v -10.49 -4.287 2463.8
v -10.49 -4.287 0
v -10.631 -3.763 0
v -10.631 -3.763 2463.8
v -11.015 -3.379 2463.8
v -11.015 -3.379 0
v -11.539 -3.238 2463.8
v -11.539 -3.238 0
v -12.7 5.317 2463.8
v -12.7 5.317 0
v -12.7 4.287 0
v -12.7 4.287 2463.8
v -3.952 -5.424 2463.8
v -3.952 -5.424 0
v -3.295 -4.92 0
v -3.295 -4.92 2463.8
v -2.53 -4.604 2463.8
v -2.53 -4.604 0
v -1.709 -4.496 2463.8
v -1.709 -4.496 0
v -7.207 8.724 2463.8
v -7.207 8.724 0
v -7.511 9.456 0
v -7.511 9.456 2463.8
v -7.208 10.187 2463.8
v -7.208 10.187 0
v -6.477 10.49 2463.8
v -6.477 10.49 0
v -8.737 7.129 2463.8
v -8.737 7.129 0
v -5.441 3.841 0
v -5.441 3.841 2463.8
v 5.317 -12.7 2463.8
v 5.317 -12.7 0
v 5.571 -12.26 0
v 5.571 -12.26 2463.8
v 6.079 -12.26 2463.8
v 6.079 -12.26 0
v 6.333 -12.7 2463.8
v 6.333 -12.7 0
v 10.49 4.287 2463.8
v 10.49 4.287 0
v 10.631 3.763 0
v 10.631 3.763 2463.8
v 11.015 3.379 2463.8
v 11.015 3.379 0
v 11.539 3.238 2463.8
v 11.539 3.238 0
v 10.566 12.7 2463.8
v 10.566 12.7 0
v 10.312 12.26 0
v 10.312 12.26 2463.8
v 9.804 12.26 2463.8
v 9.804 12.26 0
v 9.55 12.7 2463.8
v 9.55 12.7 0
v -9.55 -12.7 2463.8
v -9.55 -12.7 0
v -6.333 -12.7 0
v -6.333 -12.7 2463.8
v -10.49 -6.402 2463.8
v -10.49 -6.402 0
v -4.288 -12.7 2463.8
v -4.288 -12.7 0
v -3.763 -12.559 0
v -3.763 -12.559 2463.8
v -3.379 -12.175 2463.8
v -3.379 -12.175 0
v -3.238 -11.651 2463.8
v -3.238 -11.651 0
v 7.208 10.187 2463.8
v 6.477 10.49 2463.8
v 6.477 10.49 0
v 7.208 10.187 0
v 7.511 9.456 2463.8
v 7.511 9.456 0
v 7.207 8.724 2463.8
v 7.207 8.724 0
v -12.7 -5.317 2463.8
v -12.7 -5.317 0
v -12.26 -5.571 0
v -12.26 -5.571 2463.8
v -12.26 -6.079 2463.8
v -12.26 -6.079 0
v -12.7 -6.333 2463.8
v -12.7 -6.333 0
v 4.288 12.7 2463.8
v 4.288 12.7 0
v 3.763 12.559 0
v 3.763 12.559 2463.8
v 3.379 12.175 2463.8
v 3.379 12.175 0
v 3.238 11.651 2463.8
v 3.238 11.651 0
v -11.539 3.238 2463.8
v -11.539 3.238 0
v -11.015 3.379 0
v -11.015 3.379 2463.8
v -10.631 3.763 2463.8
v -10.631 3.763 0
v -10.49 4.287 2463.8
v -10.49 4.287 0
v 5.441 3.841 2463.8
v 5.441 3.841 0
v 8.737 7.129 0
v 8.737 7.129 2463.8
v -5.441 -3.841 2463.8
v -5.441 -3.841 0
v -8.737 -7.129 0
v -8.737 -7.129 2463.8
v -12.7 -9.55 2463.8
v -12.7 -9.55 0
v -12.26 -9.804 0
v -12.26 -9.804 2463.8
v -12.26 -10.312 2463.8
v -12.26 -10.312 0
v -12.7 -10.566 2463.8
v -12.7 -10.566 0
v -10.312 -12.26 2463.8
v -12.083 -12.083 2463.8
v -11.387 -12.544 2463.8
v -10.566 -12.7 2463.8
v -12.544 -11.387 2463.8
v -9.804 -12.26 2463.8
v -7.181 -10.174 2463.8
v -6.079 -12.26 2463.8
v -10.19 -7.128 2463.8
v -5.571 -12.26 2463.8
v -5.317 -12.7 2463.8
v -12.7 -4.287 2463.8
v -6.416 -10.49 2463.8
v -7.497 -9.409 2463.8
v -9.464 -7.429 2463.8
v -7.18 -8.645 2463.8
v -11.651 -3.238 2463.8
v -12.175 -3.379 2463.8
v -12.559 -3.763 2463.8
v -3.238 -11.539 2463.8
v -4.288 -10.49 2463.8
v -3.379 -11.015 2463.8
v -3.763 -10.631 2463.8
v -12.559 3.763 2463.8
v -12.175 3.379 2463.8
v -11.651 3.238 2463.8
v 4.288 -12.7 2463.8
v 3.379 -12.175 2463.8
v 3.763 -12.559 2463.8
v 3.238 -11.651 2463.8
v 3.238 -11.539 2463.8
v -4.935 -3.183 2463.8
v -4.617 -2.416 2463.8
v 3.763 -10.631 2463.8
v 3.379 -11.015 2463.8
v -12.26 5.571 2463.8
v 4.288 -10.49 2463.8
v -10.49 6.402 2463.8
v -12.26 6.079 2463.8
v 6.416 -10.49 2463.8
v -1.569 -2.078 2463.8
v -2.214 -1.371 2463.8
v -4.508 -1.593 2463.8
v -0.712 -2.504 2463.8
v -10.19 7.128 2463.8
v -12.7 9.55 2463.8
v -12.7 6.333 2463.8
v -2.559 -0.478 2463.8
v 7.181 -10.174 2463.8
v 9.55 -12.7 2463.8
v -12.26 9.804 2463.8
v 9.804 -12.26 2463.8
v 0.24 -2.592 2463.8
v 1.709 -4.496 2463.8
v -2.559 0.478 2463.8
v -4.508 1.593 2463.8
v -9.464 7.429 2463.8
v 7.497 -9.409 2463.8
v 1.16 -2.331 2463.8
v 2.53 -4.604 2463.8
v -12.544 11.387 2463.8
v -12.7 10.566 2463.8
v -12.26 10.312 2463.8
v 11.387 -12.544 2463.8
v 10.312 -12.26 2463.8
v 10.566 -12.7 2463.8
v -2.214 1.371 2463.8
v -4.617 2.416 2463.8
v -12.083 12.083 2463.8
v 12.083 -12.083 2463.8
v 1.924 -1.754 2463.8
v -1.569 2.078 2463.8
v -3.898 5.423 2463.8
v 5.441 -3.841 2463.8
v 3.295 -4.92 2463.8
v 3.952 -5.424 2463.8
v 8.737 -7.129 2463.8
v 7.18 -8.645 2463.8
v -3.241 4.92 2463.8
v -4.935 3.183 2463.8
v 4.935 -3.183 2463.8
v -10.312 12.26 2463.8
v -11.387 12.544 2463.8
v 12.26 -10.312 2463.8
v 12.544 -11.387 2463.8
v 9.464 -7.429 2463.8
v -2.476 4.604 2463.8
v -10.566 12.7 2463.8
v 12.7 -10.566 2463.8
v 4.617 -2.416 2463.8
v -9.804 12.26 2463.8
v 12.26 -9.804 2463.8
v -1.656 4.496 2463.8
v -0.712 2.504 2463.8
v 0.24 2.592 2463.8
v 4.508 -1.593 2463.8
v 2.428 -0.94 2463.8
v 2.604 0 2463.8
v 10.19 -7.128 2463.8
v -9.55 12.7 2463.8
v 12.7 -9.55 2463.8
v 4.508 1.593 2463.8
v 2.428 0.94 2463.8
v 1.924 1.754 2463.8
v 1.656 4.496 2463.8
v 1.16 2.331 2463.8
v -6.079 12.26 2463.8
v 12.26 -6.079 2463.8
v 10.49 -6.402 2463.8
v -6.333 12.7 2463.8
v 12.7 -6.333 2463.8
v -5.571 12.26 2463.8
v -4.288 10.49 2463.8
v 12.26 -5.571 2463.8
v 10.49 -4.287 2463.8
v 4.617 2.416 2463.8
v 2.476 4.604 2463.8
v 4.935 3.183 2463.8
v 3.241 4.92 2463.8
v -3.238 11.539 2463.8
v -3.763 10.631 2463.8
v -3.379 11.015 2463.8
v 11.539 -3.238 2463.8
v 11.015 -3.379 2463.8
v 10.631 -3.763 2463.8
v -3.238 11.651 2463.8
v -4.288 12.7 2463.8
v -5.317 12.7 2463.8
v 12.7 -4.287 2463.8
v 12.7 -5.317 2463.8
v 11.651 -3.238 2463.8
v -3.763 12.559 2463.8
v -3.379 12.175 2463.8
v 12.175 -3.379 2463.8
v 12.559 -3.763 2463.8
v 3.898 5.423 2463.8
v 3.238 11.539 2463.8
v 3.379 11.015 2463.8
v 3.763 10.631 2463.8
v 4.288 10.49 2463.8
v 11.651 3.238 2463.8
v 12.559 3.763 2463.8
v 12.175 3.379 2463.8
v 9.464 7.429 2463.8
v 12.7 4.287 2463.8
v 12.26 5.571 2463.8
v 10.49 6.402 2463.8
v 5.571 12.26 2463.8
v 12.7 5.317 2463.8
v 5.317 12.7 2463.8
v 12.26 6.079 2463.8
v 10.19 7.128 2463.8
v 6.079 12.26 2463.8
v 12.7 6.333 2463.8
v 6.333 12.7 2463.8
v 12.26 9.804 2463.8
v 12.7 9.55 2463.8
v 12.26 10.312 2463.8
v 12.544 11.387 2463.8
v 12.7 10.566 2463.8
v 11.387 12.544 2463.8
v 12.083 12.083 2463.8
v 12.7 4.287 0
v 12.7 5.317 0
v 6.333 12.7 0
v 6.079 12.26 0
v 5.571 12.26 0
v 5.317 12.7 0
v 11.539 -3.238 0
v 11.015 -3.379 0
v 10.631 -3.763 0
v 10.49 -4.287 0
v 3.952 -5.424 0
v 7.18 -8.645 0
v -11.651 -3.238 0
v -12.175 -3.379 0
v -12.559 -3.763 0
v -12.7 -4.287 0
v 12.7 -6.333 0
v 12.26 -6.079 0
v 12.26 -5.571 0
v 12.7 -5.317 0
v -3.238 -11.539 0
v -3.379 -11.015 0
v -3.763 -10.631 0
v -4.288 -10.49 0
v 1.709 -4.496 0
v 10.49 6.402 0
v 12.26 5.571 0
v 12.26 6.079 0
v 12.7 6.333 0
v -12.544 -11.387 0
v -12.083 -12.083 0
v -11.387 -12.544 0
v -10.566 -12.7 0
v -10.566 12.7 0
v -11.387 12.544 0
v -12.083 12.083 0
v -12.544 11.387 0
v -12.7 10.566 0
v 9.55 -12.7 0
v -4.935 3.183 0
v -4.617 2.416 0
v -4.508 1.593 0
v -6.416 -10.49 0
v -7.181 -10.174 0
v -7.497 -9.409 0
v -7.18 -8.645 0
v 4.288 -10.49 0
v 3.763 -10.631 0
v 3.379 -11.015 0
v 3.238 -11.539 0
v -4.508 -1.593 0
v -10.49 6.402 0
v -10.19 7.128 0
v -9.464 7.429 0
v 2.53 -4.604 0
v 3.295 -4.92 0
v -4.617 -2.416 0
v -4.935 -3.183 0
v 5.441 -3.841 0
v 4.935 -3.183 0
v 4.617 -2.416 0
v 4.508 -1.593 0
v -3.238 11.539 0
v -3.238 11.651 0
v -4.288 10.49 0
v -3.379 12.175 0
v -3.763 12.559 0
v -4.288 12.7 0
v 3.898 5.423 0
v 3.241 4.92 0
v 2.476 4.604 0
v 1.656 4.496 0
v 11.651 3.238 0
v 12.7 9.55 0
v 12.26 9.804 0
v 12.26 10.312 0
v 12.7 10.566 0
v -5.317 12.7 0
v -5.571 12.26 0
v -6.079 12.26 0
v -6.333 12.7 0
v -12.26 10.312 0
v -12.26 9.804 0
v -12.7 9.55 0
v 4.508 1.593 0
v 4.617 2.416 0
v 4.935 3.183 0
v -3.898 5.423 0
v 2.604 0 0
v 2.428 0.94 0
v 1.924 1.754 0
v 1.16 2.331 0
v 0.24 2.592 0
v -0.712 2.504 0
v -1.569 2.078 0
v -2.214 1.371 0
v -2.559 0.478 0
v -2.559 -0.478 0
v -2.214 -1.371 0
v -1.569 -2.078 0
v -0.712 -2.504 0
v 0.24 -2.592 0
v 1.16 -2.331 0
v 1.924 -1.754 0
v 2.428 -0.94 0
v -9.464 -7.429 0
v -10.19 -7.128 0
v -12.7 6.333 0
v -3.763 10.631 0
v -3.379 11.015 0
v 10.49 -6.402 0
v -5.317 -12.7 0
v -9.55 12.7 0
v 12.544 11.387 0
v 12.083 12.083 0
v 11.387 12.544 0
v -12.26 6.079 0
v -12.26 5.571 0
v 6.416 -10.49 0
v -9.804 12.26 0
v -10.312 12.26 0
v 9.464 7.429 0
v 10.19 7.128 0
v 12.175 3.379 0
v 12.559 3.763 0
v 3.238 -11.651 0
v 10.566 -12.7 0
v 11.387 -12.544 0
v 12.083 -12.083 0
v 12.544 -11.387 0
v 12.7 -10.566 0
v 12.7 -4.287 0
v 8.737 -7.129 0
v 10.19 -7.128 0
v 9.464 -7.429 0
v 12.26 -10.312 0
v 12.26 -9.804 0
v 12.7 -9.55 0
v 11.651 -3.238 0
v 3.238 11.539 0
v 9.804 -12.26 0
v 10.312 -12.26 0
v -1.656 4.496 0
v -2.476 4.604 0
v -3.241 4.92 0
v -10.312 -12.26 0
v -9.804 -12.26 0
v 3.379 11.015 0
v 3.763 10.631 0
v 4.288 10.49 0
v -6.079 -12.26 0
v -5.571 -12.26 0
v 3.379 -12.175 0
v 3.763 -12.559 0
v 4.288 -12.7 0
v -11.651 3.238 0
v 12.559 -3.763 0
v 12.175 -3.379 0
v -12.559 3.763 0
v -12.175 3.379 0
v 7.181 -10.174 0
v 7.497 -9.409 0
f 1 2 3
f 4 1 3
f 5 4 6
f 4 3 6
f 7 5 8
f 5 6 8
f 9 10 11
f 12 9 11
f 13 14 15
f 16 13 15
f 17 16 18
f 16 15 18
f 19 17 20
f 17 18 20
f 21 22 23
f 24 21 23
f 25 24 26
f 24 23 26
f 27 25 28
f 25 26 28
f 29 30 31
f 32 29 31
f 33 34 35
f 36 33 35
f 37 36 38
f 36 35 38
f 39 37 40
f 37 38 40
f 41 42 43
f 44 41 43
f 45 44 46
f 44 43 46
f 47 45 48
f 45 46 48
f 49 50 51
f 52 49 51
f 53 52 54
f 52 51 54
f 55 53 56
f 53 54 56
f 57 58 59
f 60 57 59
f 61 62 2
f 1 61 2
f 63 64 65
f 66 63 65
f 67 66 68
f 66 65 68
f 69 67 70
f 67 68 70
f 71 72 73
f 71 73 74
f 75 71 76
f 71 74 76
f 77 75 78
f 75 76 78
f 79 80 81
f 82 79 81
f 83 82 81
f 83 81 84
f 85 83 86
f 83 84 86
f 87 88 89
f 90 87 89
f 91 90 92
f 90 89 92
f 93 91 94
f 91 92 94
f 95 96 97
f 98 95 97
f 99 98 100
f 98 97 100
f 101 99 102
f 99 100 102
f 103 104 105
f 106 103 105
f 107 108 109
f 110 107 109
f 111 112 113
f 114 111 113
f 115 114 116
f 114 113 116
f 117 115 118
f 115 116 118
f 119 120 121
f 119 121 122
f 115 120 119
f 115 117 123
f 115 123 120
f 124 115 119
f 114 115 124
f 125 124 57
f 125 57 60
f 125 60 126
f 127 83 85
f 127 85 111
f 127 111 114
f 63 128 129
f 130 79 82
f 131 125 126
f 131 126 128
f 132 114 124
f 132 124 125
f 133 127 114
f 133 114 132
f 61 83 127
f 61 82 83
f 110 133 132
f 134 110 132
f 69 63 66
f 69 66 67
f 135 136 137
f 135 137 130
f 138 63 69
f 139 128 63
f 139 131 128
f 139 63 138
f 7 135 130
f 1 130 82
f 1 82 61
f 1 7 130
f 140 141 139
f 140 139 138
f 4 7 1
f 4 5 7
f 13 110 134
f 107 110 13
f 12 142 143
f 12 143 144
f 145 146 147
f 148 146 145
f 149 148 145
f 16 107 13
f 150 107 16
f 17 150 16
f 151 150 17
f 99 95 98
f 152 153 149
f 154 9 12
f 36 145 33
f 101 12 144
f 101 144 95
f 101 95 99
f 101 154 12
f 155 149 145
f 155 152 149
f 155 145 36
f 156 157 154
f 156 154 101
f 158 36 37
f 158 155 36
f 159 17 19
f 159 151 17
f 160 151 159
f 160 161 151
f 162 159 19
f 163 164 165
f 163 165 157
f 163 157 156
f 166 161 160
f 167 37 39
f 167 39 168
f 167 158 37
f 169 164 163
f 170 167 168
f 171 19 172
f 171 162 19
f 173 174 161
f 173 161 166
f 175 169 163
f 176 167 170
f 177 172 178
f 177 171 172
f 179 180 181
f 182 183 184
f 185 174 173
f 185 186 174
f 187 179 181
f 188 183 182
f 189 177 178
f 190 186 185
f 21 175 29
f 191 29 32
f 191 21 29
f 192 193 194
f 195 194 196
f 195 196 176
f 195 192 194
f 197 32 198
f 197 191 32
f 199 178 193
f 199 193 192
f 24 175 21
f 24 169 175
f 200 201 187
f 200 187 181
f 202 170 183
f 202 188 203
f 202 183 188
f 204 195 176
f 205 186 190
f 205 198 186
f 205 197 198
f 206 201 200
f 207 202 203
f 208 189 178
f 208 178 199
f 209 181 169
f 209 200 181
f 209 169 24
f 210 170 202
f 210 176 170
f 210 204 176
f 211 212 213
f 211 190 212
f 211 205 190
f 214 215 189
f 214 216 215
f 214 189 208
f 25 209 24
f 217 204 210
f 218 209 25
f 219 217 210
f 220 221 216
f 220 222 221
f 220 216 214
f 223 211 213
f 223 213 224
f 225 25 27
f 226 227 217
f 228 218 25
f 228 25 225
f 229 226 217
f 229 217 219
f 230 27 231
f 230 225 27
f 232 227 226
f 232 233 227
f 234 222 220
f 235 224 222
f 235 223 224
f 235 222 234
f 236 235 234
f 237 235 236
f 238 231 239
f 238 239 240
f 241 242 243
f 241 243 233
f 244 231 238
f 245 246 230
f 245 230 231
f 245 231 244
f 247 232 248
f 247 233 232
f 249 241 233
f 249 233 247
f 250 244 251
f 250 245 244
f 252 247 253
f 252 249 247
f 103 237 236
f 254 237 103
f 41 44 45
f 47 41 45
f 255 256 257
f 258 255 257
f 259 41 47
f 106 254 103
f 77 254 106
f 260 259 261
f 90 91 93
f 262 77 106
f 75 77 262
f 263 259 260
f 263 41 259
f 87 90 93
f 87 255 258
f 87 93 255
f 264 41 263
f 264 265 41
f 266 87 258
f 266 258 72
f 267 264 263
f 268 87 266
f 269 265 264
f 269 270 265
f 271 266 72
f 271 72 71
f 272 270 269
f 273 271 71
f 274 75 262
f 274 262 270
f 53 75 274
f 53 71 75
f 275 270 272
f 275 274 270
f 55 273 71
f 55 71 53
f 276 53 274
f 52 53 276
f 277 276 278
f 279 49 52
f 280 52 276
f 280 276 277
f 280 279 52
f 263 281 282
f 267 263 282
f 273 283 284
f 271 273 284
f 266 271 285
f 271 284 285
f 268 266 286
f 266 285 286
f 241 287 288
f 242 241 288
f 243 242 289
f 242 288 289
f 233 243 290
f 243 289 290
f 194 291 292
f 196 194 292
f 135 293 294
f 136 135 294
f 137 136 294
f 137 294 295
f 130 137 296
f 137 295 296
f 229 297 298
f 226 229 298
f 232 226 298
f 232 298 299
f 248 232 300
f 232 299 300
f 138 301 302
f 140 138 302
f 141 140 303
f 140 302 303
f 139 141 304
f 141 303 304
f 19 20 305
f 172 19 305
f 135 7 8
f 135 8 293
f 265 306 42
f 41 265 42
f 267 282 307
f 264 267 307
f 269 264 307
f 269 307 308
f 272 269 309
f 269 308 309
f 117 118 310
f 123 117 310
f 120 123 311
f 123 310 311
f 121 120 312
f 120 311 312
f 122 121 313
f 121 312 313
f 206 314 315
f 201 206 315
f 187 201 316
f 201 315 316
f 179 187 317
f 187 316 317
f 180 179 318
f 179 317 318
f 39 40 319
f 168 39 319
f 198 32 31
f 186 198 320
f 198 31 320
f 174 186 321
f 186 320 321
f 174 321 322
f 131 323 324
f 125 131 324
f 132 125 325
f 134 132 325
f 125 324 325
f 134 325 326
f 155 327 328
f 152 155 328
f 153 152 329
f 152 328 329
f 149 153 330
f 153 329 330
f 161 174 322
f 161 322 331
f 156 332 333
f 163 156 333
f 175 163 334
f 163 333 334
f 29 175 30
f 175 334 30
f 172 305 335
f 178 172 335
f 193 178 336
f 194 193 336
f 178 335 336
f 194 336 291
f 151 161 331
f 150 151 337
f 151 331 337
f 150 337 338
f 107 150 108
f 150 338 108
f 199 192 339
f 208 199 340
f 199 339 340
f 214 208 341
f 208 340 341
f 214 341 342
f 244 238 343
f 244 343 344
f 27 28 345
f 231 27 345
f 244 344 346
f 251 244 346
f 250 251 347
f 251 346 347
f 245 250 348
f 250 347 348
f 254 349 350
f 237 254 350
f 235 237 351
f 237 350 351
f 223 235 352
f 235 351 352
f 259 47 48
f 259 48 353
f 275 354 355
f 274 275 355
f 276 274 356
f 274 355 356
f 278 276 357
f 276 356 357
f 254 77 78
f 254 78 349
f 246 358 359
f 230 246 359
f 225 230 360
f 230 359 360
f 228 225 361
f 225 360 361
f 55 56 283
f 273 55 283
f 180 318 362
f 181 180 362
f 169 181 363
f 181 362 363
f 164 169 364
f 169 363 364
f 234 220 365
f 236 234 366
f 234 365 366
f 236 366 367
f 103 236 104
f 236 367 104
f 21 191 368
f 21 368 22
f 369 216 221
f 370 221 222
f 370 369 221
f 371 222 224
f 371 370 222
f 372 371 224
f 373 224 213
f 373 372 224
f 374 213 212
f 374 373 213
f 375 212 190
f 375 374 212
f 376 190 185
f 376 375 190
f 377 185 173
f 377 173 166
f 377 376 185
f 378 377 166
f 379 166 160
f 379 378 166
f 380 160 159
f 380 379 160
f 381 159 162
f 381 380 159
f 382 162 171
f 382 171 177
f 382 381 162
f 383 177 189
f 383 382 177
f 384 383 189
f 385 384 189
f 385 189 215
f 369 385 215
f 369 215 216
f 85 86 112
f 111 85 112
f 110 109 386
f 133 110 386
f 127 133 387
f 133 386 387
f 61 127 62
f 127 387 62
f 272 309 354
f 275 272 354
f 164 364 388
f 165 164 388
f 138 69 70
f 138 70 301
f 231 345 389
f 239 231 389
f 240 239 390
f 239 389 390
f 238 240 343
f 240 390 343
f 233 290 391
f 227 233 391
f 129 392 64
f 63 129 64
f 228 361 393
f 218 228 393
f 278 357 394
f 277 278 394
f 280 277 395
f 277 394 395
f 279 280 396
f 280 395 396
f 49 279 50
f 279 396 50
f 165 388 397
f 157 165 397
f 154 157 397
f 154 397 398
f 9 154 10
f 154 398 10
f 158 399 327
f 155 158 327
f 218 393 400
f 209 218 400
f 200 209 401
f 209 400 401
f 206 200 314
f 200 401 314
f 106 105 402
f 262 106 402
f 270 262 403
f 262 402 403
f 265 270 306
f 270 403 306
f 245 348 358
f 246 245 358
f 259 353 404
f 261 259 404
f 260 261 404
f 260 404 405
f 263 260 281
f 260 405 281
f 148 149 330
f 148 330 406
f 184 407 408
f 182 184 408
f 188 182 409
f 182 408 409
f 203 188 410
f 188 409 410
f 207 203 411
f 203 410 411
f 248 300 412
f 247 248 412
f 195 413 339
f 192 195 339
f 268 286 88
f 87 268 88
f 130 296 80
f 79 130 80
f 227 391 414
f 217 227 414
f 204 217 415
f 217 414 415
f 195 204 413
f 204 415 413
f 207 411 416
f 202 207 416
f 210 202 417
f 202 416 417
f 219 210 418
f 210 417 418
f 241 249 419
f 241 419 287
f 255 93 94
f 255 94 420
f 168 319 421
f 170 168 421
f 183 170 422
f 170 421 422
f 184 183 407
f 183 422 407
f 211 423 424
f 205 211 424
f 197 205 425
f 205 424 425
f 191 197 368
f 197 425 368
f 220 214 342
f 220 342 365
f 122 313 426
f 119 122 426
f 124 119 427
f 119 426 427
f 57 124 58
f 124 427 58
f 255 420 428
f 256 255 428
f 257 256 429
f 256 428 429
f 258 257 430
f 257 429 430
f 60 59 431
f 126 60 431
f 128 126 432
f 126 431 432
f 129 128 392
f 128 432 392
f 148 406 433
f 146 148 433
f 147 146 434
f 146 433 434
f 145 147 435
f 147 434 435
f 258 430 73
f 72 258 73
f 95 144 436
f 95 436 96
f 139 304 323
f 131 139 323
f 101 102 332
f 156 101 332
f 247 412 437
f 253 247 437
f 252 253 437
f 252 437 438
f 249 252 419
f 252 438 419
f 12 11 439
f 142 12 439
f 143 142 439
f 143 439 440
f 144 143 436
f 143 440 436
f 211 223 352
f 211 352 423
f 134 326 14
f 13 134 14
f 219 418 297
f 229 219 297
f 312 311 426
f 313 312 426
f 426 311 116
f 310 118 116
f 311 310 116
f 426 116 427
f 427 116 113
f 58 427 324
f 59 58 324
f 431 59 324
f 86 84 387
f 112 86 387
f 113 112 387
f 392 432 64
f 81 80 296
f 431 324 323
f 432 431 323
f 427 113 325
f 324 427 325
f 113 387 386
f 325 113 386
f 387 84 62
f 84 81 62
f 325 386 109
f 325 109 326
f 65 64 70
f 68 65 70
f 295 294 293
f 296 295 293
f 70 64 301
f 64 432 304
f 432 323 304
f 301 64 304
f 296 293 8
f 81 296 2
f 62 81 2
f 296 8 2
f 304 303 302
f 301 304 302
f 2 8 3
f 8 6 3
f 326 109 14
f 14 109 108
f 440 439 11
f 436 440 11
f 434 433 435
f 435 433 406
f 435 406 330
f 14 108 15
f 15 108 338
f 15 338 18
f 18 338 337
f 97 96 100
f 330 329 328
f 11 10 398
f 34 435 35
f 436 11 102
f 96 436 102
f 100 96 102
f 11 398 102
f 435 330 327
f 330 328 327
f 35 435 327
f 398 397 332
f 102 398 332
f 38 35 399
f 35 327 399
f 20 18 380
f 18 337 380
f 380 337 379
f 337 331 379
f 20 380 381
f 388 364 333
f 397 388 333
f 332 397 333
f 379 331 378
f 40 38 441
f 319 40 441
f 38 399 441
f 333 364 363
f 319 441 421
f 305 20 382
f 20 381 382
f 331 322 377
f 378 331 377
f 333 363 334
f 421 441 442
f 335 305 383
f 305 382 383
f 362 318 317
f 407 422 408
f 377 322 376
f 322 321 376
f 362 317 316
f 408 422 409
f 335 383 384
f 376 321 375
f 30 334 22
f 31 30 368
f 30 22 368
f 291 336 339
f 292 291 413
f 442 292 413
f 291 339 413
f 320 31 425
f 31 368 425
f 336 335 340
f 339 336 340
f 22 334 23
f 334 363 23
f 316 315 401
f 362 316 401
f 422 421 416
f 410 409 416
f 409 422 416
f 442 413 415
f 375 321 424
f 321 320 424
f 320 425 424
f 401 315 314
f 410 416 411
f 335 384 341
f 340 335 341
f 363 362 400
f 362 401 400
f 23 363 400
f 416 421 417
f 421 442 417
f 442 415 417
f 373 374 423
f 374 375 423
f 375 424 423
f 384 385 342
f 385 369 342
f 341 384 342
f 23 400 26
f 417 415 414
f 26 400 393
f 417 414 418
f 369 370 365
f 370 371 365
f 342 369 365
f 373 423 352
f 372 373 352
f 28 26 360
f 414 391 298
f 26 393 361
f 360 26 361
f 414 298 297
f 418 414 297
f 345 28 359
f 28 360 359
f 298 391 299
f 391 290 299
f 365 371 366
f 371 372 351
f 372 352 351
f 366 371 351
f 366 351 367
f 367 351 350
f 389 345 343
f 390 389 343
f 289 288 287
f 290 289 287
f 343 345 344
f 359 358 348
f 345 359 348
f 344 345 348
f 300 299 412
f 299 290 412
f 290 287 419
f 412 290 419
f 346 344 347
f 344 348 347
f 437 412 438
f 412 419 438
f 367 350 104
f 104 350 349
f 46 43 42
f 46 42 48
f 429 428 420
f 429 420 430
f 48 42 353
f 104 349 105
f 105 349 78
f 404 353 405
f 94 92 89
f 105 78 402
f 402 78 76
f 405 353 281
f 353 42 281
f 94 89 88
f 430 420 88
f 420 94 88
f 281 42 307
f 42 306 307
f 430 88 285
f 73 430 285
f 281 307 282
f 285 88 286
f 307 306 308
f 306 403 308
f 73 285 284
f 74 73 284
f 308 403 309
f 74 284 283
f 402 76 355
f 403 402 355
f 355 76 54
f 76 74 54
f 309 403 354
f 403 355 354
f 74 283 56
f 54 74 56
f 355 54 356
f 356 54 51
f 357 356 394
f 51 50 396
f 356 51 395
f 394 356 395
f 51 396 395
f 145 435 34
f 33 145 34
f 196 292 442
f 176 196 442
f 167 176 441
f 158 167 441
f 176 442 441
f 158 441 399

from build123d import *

# Parameters (mm, degrees)
SKETCH1_R           = 2.6035
BOSS_EXTRUDE1_DEPTH = 2463.8


with BuildPart() as part:
    # Sketch1 → Boss-Extrude1 (new body)
    with BuildSketch(Plane.XY):
        with BuildLine():
            Line((-1.709253557, -4.4958), (1.709253557, -4.4958))
            ThreePointArc((1.709253557, -4.4958), (2.922936451, -4.736929036), (3.952270251, -5.423690499))
            Line((3.952270251, -5.423690499), (7.179650497, -8.645192506))
            ThreePointArc((7.179650497, -8.645192506), (7.41473083, -9.822813117), (6.416408329, -10.4902))
            Line((6.416408329, -10.4902), (4.287512407, -10.4902))
            ThreePointArc((4.287512407, -10.4902), (3.54574862, -10.79744862), (3.2385, -11.539212407))
            Line((3.2385, -11.539212407), (3.2385, -11.650987593))
            ThreePointArc((3.2385, -11.650987593), (3.54574862, -12.39275138), (4.287512407, -12.7))
            Line((4.287512407, -12.7), (5.317126718, -12.7))
            ThreePointArc((5.317126718, -12.7), (5.825126718, -12.192), (6.333126718, -12.7))
            Line((6.333126718, -12.7), (9.550443118, -12.7))
            ThreePointArc((9.550443118, -12.7), (10.058366869, -12.192000006), (10.566443095, -12.699847501))
            ThreePointArc((10.566443095, -12.699847501), (12.082537762, -12.08250727), (12.699846982, -10.566399977))
            ThreePointArc((12.699846982, -10.566399977), (12.192000006, -10.058323491), (12.7, -9.5504))
            Line((12.7, -9.5504), (12.7, -6.3330836))
            ThreePointArc((12.7, -6.3330836), (12.192, -5.8250836), (12.7, -5.3170836))
            Line((12.7, -5.3170836), (12.7, -4.287469289))
            ThreePointArc((12.7, -4.287469289), (12.39275138, -3.545705502), (11.650987593, -3.238456882))
            Line((11.650987593, -3.238456882), (11.539212407, -3.238456882))
            ThreePointArc((11.539212407, -3.238456882), (10.79744862, -3.545705502), (10.4902, -4.287469289))
            Line((10.4902, -4.287469289), (10.4902, -6.402089023))
            ThreePointArc((10.4902, -6.402089023), (9.856505071, -7.351067942), (8.737131347, -7.129408934))
            Line((8.737131347, -7.129408934), (5.441005833, -3.840816462))
            ThreePointArc((5.441005833, -3.840816462), (4.750877967, -2.809883091), (4.5085, -1.593185507))
            Line((4.5085, -1.593185507), (4.5085, 1.593185507))
            ThreePointArc((4.5085, 1.593185507), (4.750877967, 2.809883091), (5.441005833, 3.840816462))
            Line((5.441005833, 3.840816462), (8.737131347, 7.129408934))
            ThreePointArc((8.737131347, 7.129408934), (9.856505071, 7.351067942), (10.4902, 6.402089023))
            Line((10.4902, 6.402089023), (10.4902, 4.287469289))
            ThreePointArc((10.4902, 4.287469289), (10.79744862, 3.545705502), (11.539212407, 3.238456882))
            Line((11.539212407, 3.238456882), (11.650987593, 3.238456882))
            ThreePointArc((11.650987593, 3.238456882), (12.39275138, 3.545705502), (12.7, 4.287469289))
            Line((12.7, 4.287469289), (12.7, 5.3170836))
            ThreePointArc((12.7, 5.3170836), (12.192, 5.8250836), (12.7, 6.3330836))
            Line((12.7, 6.3330836), (12.7, 9.5504))
            ThreePointArc((12.7, 9.5504), (12.192000006, 10.058323491), (12.699846982, 10.566399977))
            ThreePointArc((12.699846982, 10.566399977), (12.082537762, 12.08250727), (10.566443095, 12.699847501))
            ThreePointArc((10.566443095, 12.699847501), (10.058366869, 12.192000006), (9.550443118, 12.7))
            Line((9.550443118, 12.7), (6.333126718, 12.7))
            ThreePointArc((6.333126718, 12.7), (5.825126718, 12.192), (5.317126718, 12.7))
            Line((5.317126718, 12.7), (4.287512407, 12.7))
            ThreePointArc((4.287512407, 12.7), (3.54574862, 12.39275138), (3.2385, 11.650987593))
            Line((3.2385, 11.650987593), (3.2385, 11.539212407))
            ThreePointArc((3.2385, 11.539212407), (3.54574862, 10.79744862), (4.287512407, 10.4902))
            Line((4.287512407, 10.4902), (6.476788598, 10.4902))
            ThreePointArc((6.476788598, 10.4902), (7.432222385, 9.85140422), (7.207036008, 8.724370562))
            Line((7.207036008, 8.724370562), (3.898272566, 5.423169045))
            ThreePointArc((3.898272566, 5.423169045), (2.869120213, 4.736787962), (1.655778399, 4.4958))
            Line((1.655778399, 4.4958), (-1.655778399, 4.4958))
            ThreePointArc((-1.655778399, 4.4958), (-2.869120213, 4.736787962), (-3.898272566, 5.423169045))
            Line((-3.898272566, 5.423169045), (-7.207036008, 8.724370562))
            ThreePointArc((-7.207036008, 8.724370562), (-7.432222385, 9.85140422), (-6.476788598, 10.4902))
            Line((-6.476788598, 10.4902), (-4.287512407, 10.4902))
            ThreePointArc((-4.287512407, 10.4902), (-3.54574862, 10.79744862), (-3.2385, 11.539212407))
            Line((-3.2385, 11.539212407), (-3.2385, 11.650987593))
            ThreePointArc((-3.2385, 11.650987593), (-3.54574862, 12.39275138), (-4.287512407, 12.7))
            Line((-4.287512407, 12.7), (-5.317126718, 12.7))
            ThreePointArc((-5.317126718, 12.7), (-5.825126718, 12.192), (-6.333126718, 12.7))
            Line((-6.333126718, 12.7), (-9.550443118, 12.7))
            ThreePointArc((-9.550443118, 12.7), (-10.058366869, 12.192000006), (-10.566443095, 12.699847501))
            ThreePointArc((-10.566443095, 12.699847501), (-12.082537762, 12.08250727), (-12.699846982, 10.566399977))
            ThreePointArc((-12.699846982, 10.566399977), (-12.192000006, 10.058323491), (-12.7, 9.5504))
            Line((-12.7, 9.5504), (-12.7, 6.3330836))
            ThreePointArc((-12.7, 6.3330836), (-12.192, 5.8250836), (-12.7, 5.3170836))
            Line((-12.7, 5.3170836), (-12.7, 4.287469289))
            ThreePointArc((-12.7, 4.287469289), (-12.39275138, 3.545705502), (-11.650987593, 3.238456882))
            Line((-11.650987593, 3.238456882), (-11.539212407, 3.238456882))
            ThreePointArc((-11.539212407, 3.238456882), (-10.79744862, 3.545705502), (-10.4902, 4.287469289))
            Line((-10.4902, 4.287469289), (-10.4902, 6.402089023))
            ThreePointArc((-10.4902, 6.402089023), (-9.856505071, 7.351067942), (-8.737131347, 7.129408934))
            Line((-8.737131347, 7.129408934), (-5.441005833, 3.840816462))
            ThreePointArc((-5.441005833, 3.840816462), (-4.750877967, 2.809883091), (-4.5085, 1.593185507))
            Line((-4.5085, 1.593185507), (-4.5085, -1.593185507))
            ThreePointArc((-4.5085, -1.593185507), (-4.750877967, -2.809883091), (-5.441005833, -3.840816462))
            Line((-5.441005833, -3.840816462), (-8.737131347, -7.129408934))
            ThreePointArc((-8.737131347, -7.129408934), (-9.856505071, -7.351067942), (-10.4902, -6.402089023))
            Line((-10.4902, -6.402089023), (-10.4902, -4.287469289))
            ThreePointArc((-10.4902, -4.287469289), (-10.79744862, -3.545705502), (-11.539212407, -3.238456882))
            Line((-11.539212407, -3.238456882), (-11.650987593, -3.238456882))
            ThreePointArc((-11.650987593, -3.238456882), (-12.39275138, -3.545705502), (-12.7, -4.287469289))
            Line((-12.7, -4.287469289), (-12.7, -5.3170836))
            ThreePointArc((-12.7, -5.3170836), (-12.192, -5.8250836), (-12.7, -6.3330836))
            Line((-12.7, -6.3330836), (-12.7, -9.5504))
            ThreePointArc((-12.7, -9.5504), (-12.192000006, -10.058323491), (-12.699846982, -10.566399977))
            ThreePointArc((-12.699846982, -10.566399977), (-12.082537762, -12.08250727), (-10.566443095, -12.699847501))
            ThreePointArc((-10.566443095, -12.699847501), (-10.058366869, -12.192000006), (-9.550443118, -12.7))
            Line((-9.550443118, -12.7), (-6.333126718, -12.7))
            ThreePointArc((-6.333126718, -12.7), (-5.825126718, -12.192), (-5.317126718, -12.7))
            Line((-5.317126718, -12.7), (-4.287512407, -12.7))
            ThreePointArc((-4.287512407, -12.7), (-3.54574862, -12.39275138), (-3.2385, -11.650987593))
            Line((-3.2385, -11.650987593), (-3.2385, -11.539212407))
            ThreePointArc((-3.2385, -11.539212407), (-3.54574862, -10.79744862), (-4.287512407, -10.4902))
            Line((-4.287512407, -10.4902), (-6.416408329, -10.4902))
            ThreePointArc((-6.416408329, -10.4902), (-7.41473083, -9.822813117), (-7.179650497, -8.645192506))
            Line((-7.179650497, -8.645192506), (-3.952270251, -5.423690499))
            ThreePointArc((-3.952270251, -5.423690499), (-2.922936451, -4.736929036), (-1.709253557, -4.4958))
        make_face()
        Circle(SKETCH1_R, mode=Mode.SUBTRACT)
    extrude(amount=BOSS_EXTRUDE1_DEPTH)


solid = part.part
